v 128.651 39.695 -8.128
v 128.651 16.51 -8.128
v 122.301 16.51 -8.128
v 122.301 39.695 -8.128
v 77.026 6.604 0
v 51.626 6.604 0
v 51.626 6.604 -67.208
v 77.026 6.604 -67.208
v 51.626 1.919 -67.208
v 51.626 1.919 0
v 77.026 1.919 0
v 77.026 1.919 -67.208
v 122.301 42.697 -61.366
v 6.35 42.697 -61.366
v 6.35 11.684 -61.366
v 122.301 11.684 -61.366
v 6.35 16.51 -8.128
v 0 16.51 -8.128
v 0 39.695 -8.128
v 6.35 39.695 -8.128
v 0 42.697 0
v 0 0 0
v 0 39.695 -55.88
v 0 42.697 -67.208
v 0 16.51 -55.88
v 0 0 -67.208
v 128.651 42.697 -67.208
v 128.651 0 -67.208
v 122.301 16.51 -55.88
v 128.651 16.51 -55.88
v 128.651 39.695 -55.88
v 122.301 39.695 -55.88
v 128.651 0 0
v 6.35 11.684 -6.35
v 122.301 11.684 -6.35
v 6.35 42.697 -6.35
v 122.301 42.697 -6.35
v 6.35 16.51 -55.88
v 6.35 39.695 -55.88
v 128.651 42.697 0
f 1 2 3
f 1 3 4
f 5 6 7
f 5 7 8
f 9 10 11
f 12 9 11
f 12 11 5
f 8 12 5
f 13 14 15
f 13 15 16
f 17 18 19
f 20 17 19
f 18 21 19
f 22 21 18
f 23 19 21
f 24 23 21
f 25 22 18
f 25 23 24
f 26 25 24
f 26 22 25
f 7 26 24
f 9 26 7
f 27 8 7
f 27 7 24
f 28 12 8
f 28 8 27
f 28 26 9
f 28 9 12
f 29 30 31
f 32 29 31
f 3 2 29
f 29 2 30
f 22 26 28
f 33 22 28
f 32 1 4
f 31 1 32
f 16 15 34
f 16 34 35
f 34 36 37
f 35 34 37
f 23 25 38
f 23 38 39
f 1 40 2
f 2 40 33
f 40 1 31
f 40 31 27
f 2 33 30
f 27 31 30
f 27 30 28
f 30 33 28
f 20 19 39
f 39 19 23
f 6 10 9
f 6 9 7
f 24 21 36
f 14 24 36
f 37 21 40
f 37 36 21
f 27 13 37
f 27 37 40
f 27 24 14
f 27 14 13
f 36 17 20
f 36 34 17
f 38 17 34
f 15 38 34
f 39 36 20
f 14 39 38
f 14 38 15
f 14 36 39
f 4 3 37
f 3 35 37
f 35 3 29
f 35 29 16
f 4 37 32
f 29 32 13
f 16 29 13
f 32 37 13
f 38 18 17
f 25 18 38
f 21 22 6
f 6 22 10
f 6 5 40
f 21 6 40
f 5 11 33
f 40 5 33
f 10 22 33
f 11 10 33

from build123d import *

# Parameters (mm, degrees)
SKETCH1_W           = 128.651
SKETCH1_H           = 67.2084
BOSS_EXTRUDE1_DEPTH = 42.6974
SKETCH2_W           = 115.951
SKETCH2_H           = 55.0164
CUT_EXTRUDE1_DEPTH  = 31.0134
SKETCH3_W           = 25.4
SKETCH3_H           = 4.684620624
CUT_EXTRUDE2_DEPTH  = 67.7164
SKETCH5_W           = 47.752
SKETCH5_H           = 23.185308257
CUT_EXTRUDE3_DEPTH  = 6.35


with BuildPart() as part:
    # Sketch1 → Boss-Extrude1 (new body)
    with BuildSketch(Plane(origin=(0, 0, 0), x_dir=(1, 0, 0), z_dir=(0, 1, 0))):
        with Locations((64.3255, 33.6042)):
            Rectangle(SKETCH1_W, SKETCH1_H)
    extrude(amount=BOSS_EXTRUDE1_DEPTH)

    # Sketch2 → Cut-Extrude1 (cut)
    with BuildSketch(Plane(origin=(0, 42.6974, 0), x_dir=(1, 0, 0), z_dir=(0, 1, 0))):
        with Locations((64.3255, 33.8582)):
            Rectangle(SKETCH2_W, SKETCH2_H)
    extrude(amount=-CUT_EXTRUDE1_DEPTH, mode=Mode.SUBTRACT)

    # Sketch3 → Cut-Extrude2 (cut)
    with BuildSketch(Plane.XY):
        with Locations((64.3255, 4.261689688)):
            Rectangle(SKETCH3_W, SKETCH3_H)
    extrude(amount=-CUT_EXTRUDE2_DEPTH, mode=Mode.SUBTRACT)

    # Sketch5 → Cut-Extrude3 (cut)
    with BuildSketch(Plane(origin=(128.651, 0, 0), x_dir=(0, 0, -1), z_dir=(1, 0, 0))):
        with Locations((32.004, 28.102654128)):
            Rectangle(SKETCH5_W, SKETCH5_H)
    cut_extrude3 = extrude(amount=-CUT_EXTRUDE3_DEPTH, mode=Mode.SUBTRACT)

    # Mirror1: Cut-Extrude3 across plane
    add(cut_extrude3.mirror(Plane.ZY.offset(-64.3255)), mode=Mode.SUBTRACT)


solid = part.part
